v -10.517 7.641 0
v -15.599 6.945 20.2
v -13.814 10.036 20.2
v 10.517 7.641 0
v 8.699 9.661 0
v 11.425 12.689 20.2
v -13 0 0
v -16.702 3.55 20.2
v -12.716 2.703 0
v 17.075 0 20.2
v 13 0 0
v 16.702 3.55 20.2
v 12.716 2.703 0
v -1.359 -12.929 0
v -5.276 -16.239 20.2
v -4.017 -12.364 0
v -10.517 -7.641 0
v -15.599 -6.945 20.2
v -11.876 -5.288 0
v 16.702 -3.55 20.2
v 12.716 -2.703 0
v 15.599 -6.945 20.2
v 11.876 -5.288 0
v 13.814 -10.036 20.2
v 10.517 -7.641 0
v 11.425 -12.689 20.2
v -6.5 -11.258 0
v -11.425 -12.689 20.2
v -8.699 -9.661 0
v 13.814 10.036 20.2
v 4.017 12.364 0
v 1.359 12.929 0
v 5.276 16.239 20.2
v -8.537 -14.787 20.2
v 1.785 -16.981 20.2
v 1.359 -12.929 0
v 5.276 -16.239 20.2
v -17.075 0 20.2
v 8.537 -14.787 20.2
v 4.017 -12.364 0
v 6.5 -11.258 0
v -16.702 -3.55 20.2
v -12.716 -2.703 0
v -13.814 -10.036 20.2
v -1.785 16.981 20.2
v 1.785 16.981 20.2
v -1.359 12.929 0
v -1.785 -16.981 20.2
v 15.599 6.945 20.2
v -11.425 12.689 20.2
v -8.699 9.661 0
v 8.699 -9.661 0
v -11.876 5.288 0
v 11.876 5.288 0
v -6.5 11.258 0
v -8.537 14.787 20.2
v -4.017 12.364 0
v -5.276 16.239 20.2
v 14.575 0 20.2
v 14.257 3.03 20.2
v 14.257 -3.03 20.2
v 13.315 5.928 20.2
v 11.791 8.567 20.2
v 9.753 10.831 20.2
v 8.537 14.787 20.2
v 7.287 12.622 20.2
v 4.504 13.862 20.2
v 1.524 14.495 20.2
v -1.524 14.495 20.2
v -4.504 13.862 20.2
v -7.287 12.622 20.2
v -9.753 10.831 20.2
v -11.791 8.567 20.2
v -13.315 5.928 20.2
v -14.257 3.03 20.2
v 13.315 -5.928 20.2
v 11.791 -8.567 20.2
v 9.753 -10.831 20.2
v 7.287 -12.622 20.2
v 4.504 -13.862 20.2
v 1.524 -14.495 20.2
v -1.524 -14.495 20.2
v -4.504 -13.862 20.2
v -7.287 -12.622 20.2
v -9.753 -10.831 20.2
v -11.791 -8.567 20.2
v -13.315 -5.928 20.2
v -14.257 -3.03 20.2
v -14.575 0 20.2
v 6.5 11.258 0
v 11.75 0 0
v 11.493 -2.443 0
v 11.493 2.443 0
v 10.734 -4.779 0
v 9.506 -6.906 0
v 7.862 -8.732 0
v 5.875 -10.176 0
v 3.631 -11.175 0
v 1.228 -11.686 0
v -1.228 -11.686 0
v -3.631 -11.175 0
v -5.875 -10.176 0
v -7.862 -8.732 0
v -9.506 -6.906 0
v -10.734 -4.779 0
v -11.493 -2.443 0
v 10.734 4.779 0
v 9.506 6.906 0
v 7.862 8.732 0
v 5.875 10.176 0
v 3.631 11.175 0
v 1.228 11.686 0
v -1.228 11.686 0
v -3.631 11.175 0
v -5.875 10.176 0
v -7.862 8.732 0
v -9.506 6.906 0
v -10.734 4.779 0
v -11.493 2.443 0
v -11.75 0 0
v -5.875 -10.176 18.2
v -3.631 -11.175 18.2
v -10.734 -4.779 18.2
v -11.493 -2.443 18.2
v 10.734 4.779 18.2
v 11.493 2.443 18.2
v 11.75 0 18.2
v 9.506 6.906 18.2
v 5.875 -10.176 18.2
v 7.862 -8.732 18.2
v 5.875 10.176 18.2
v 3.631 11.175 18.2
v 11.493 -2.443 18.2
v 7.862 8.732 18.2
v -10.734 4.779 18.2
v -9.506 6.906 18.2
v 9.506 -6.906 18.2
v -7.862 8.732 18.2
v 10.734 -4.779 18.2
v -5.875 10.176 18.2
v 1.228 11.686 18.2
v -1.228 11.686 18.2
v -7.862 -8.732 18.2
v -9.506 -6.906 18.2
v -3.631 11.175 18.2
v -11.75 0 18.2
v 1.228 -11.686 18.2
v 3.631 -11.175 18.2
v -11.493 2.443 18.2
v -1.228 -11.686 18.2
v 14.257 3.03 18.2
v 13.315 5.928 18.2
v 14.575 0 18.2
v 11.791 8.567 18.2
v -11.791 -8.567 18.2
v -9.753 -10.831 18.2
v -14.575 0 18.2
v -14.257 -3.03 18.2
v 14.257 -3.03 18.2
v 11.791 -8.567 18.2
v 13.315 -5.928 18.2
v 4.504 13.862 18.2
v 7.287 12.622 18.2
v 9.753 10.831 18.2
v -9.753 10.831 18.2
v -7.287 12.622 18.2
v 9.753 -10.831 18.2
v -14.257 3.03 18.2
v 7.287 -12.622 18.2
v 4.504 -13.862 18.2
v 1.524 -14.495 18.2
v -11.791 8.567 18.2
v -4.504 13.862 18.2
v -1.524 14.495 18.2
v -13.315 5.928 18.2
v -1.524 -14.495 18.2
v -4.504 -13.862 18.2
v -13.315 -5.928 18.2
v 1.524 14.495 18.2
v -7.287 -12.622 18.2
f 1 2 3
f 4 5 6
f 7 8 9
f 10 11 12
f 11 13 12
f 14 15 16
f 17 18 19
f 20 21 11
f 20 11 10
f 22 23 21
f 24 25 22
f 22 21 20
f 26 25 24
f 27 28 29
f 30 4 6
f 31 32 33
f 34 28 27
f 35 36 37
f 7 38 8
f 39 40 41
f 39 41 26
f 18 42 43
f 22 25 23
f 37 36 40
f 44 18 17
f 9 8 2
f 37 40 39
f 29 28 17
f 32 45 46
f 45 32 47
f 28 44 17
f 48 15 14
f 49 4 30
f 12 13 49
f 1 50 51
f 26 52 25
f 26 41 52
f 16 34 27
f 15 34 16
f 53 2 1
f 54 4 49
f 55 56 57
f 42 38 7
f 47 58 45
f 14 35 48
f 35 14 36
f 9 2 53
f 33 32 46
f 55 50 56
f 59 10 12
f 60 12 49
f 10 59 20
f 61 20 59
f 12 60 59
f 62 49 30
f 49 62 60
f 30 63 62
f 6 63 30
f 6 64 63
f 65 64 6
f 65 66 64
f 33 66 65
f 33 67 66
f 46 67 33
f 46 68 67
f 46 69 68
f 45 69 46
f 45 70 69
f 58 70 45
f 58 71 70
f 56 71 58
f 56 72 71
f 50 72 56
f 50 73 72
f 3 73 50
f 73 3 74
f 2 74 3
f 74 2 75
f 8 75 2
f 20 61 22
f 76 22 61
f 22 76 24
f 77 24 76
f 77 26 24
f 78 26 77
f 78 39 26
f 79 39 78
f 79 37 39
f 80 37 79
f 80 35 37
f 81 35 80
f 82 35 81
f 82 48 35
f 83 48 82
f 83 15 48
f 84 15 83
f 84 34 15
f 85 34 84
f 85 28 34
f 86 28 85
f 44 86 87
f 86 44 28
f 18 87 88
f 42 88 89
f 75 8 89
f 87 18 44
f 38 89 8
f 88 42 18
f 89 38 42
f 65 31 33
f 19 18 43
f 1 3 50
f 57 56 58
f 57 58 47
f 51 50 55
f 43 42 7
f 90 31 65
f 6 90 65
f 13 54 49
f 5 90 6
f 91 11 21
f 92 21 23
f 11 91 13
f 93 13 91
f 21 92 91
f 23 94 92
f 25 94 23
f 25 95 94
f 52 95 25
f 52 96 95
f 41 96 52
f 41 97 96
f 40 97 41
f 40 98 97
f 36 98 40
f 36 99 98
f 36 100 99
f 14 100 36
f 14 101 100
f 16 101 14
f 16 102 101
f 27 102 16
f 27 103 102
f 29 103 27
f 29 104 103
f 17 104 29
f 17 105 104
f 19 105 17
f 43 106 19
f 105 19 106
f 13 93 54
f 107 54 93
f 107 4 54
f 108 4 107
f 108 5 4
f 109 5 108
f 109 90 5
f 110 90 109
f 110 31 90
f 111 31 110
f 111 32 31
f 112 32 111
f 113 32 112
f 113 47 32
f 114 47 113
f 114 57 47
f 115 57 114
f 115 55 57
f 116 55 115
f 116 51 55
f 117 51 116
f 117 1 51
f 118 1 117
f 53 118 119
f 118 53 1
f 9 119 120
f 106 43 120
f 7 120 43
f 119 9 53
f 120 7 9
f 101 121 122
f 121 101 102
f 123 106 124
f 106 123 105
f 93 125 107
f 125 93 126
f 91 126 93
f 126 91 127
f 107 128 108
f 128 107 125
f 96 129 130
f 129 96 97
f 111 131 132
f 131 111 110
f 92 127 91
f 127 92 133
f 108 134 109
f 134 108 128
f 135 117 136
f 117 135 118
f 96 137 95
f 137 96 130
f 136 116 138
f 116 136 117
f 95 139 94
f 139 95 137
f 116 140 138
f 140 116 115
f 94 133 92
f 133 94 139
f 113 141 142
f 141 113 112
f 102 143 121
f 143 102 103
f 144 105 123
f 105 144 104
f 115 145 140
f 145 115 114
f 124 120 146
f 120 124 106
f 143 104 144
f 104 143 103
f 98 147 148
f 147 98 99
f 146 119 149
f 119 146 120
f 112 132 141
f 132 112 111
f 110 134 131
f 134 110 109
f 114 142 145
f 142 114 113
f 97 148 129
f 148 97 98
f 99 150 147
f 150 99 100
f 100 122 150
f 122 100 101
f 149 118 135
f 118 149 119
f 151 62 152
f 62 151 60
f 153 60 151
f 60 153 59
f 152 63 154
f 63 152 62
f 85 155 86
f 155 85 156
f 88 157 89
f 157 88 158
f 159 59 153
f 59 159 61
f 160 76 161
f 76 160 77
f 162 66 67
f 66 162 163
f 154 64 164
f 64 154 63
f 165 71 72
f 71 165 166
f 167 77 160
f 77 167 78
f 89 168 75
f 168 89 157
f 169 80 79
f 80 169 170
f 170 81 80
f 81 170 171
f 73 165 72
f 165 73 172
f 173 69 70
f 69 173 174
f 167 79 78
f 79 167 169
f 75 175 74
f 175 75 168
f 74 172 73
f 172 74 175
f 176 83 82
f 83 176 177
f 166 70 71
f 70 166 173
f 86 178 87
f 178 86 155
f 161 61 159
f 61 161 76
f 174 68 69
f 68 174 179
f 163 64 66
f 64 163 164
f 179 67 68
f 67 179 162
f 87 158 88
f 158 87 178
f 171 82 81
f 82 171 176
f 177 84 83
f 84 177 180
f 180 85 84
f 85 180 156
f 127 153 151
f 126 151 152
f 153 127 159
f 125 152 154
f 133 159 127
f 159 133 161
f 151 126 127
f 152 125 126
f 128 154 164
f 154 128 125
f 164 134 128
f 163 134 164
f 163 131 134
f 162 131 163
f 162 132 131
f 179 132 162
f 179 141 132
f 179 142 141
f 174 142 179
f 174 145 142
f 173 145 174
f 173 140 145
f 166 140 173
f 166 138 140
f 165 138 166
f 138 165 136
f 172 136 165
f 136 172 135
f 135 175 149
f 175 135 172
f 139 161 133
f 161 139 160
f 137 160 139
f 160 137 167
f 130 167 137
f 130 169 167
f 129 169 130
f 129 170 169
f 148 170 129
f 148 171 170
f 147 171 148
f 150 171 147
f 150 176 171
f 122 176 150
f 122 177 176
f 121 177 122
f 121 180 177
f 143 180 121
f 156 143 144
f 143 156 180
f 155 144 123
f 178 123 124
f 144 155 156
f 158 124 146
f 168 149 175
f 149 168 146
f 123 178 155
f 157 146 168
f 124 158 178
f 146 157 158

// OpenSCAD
// Tube Stuff
barrel_depth = 13.9;
barrel_length = 15;
barrel_diameter = 24.25-.75;
tube_thickness = 2.5;


// Lense Stuff
culminator_lense_diameter = 29.9-.75;
focal_length = 14.6;
led_height = 4.5;
lense_lip_depth = 2;


 
module culminator_tube(){
	// Do some maths
	tube_height  = (barrel_length - barrel_depth) + focal_length + led_height;
	difference(){
		difference(){
			cylinder(h = tube_height, r2 = (culminator_lense_diameter/2 + tube_thickness), r1 = (barrel_diameter + tube_thickness)/2);
			cylinder(h = tube_height, r = barrel_diameter/2);
		}
		translate([0,0,tube_height - lense_lip_depth]) cylinder(h = 2.2, r = culminator_lense_diameter/2);
	}
}

culminator_tube();
